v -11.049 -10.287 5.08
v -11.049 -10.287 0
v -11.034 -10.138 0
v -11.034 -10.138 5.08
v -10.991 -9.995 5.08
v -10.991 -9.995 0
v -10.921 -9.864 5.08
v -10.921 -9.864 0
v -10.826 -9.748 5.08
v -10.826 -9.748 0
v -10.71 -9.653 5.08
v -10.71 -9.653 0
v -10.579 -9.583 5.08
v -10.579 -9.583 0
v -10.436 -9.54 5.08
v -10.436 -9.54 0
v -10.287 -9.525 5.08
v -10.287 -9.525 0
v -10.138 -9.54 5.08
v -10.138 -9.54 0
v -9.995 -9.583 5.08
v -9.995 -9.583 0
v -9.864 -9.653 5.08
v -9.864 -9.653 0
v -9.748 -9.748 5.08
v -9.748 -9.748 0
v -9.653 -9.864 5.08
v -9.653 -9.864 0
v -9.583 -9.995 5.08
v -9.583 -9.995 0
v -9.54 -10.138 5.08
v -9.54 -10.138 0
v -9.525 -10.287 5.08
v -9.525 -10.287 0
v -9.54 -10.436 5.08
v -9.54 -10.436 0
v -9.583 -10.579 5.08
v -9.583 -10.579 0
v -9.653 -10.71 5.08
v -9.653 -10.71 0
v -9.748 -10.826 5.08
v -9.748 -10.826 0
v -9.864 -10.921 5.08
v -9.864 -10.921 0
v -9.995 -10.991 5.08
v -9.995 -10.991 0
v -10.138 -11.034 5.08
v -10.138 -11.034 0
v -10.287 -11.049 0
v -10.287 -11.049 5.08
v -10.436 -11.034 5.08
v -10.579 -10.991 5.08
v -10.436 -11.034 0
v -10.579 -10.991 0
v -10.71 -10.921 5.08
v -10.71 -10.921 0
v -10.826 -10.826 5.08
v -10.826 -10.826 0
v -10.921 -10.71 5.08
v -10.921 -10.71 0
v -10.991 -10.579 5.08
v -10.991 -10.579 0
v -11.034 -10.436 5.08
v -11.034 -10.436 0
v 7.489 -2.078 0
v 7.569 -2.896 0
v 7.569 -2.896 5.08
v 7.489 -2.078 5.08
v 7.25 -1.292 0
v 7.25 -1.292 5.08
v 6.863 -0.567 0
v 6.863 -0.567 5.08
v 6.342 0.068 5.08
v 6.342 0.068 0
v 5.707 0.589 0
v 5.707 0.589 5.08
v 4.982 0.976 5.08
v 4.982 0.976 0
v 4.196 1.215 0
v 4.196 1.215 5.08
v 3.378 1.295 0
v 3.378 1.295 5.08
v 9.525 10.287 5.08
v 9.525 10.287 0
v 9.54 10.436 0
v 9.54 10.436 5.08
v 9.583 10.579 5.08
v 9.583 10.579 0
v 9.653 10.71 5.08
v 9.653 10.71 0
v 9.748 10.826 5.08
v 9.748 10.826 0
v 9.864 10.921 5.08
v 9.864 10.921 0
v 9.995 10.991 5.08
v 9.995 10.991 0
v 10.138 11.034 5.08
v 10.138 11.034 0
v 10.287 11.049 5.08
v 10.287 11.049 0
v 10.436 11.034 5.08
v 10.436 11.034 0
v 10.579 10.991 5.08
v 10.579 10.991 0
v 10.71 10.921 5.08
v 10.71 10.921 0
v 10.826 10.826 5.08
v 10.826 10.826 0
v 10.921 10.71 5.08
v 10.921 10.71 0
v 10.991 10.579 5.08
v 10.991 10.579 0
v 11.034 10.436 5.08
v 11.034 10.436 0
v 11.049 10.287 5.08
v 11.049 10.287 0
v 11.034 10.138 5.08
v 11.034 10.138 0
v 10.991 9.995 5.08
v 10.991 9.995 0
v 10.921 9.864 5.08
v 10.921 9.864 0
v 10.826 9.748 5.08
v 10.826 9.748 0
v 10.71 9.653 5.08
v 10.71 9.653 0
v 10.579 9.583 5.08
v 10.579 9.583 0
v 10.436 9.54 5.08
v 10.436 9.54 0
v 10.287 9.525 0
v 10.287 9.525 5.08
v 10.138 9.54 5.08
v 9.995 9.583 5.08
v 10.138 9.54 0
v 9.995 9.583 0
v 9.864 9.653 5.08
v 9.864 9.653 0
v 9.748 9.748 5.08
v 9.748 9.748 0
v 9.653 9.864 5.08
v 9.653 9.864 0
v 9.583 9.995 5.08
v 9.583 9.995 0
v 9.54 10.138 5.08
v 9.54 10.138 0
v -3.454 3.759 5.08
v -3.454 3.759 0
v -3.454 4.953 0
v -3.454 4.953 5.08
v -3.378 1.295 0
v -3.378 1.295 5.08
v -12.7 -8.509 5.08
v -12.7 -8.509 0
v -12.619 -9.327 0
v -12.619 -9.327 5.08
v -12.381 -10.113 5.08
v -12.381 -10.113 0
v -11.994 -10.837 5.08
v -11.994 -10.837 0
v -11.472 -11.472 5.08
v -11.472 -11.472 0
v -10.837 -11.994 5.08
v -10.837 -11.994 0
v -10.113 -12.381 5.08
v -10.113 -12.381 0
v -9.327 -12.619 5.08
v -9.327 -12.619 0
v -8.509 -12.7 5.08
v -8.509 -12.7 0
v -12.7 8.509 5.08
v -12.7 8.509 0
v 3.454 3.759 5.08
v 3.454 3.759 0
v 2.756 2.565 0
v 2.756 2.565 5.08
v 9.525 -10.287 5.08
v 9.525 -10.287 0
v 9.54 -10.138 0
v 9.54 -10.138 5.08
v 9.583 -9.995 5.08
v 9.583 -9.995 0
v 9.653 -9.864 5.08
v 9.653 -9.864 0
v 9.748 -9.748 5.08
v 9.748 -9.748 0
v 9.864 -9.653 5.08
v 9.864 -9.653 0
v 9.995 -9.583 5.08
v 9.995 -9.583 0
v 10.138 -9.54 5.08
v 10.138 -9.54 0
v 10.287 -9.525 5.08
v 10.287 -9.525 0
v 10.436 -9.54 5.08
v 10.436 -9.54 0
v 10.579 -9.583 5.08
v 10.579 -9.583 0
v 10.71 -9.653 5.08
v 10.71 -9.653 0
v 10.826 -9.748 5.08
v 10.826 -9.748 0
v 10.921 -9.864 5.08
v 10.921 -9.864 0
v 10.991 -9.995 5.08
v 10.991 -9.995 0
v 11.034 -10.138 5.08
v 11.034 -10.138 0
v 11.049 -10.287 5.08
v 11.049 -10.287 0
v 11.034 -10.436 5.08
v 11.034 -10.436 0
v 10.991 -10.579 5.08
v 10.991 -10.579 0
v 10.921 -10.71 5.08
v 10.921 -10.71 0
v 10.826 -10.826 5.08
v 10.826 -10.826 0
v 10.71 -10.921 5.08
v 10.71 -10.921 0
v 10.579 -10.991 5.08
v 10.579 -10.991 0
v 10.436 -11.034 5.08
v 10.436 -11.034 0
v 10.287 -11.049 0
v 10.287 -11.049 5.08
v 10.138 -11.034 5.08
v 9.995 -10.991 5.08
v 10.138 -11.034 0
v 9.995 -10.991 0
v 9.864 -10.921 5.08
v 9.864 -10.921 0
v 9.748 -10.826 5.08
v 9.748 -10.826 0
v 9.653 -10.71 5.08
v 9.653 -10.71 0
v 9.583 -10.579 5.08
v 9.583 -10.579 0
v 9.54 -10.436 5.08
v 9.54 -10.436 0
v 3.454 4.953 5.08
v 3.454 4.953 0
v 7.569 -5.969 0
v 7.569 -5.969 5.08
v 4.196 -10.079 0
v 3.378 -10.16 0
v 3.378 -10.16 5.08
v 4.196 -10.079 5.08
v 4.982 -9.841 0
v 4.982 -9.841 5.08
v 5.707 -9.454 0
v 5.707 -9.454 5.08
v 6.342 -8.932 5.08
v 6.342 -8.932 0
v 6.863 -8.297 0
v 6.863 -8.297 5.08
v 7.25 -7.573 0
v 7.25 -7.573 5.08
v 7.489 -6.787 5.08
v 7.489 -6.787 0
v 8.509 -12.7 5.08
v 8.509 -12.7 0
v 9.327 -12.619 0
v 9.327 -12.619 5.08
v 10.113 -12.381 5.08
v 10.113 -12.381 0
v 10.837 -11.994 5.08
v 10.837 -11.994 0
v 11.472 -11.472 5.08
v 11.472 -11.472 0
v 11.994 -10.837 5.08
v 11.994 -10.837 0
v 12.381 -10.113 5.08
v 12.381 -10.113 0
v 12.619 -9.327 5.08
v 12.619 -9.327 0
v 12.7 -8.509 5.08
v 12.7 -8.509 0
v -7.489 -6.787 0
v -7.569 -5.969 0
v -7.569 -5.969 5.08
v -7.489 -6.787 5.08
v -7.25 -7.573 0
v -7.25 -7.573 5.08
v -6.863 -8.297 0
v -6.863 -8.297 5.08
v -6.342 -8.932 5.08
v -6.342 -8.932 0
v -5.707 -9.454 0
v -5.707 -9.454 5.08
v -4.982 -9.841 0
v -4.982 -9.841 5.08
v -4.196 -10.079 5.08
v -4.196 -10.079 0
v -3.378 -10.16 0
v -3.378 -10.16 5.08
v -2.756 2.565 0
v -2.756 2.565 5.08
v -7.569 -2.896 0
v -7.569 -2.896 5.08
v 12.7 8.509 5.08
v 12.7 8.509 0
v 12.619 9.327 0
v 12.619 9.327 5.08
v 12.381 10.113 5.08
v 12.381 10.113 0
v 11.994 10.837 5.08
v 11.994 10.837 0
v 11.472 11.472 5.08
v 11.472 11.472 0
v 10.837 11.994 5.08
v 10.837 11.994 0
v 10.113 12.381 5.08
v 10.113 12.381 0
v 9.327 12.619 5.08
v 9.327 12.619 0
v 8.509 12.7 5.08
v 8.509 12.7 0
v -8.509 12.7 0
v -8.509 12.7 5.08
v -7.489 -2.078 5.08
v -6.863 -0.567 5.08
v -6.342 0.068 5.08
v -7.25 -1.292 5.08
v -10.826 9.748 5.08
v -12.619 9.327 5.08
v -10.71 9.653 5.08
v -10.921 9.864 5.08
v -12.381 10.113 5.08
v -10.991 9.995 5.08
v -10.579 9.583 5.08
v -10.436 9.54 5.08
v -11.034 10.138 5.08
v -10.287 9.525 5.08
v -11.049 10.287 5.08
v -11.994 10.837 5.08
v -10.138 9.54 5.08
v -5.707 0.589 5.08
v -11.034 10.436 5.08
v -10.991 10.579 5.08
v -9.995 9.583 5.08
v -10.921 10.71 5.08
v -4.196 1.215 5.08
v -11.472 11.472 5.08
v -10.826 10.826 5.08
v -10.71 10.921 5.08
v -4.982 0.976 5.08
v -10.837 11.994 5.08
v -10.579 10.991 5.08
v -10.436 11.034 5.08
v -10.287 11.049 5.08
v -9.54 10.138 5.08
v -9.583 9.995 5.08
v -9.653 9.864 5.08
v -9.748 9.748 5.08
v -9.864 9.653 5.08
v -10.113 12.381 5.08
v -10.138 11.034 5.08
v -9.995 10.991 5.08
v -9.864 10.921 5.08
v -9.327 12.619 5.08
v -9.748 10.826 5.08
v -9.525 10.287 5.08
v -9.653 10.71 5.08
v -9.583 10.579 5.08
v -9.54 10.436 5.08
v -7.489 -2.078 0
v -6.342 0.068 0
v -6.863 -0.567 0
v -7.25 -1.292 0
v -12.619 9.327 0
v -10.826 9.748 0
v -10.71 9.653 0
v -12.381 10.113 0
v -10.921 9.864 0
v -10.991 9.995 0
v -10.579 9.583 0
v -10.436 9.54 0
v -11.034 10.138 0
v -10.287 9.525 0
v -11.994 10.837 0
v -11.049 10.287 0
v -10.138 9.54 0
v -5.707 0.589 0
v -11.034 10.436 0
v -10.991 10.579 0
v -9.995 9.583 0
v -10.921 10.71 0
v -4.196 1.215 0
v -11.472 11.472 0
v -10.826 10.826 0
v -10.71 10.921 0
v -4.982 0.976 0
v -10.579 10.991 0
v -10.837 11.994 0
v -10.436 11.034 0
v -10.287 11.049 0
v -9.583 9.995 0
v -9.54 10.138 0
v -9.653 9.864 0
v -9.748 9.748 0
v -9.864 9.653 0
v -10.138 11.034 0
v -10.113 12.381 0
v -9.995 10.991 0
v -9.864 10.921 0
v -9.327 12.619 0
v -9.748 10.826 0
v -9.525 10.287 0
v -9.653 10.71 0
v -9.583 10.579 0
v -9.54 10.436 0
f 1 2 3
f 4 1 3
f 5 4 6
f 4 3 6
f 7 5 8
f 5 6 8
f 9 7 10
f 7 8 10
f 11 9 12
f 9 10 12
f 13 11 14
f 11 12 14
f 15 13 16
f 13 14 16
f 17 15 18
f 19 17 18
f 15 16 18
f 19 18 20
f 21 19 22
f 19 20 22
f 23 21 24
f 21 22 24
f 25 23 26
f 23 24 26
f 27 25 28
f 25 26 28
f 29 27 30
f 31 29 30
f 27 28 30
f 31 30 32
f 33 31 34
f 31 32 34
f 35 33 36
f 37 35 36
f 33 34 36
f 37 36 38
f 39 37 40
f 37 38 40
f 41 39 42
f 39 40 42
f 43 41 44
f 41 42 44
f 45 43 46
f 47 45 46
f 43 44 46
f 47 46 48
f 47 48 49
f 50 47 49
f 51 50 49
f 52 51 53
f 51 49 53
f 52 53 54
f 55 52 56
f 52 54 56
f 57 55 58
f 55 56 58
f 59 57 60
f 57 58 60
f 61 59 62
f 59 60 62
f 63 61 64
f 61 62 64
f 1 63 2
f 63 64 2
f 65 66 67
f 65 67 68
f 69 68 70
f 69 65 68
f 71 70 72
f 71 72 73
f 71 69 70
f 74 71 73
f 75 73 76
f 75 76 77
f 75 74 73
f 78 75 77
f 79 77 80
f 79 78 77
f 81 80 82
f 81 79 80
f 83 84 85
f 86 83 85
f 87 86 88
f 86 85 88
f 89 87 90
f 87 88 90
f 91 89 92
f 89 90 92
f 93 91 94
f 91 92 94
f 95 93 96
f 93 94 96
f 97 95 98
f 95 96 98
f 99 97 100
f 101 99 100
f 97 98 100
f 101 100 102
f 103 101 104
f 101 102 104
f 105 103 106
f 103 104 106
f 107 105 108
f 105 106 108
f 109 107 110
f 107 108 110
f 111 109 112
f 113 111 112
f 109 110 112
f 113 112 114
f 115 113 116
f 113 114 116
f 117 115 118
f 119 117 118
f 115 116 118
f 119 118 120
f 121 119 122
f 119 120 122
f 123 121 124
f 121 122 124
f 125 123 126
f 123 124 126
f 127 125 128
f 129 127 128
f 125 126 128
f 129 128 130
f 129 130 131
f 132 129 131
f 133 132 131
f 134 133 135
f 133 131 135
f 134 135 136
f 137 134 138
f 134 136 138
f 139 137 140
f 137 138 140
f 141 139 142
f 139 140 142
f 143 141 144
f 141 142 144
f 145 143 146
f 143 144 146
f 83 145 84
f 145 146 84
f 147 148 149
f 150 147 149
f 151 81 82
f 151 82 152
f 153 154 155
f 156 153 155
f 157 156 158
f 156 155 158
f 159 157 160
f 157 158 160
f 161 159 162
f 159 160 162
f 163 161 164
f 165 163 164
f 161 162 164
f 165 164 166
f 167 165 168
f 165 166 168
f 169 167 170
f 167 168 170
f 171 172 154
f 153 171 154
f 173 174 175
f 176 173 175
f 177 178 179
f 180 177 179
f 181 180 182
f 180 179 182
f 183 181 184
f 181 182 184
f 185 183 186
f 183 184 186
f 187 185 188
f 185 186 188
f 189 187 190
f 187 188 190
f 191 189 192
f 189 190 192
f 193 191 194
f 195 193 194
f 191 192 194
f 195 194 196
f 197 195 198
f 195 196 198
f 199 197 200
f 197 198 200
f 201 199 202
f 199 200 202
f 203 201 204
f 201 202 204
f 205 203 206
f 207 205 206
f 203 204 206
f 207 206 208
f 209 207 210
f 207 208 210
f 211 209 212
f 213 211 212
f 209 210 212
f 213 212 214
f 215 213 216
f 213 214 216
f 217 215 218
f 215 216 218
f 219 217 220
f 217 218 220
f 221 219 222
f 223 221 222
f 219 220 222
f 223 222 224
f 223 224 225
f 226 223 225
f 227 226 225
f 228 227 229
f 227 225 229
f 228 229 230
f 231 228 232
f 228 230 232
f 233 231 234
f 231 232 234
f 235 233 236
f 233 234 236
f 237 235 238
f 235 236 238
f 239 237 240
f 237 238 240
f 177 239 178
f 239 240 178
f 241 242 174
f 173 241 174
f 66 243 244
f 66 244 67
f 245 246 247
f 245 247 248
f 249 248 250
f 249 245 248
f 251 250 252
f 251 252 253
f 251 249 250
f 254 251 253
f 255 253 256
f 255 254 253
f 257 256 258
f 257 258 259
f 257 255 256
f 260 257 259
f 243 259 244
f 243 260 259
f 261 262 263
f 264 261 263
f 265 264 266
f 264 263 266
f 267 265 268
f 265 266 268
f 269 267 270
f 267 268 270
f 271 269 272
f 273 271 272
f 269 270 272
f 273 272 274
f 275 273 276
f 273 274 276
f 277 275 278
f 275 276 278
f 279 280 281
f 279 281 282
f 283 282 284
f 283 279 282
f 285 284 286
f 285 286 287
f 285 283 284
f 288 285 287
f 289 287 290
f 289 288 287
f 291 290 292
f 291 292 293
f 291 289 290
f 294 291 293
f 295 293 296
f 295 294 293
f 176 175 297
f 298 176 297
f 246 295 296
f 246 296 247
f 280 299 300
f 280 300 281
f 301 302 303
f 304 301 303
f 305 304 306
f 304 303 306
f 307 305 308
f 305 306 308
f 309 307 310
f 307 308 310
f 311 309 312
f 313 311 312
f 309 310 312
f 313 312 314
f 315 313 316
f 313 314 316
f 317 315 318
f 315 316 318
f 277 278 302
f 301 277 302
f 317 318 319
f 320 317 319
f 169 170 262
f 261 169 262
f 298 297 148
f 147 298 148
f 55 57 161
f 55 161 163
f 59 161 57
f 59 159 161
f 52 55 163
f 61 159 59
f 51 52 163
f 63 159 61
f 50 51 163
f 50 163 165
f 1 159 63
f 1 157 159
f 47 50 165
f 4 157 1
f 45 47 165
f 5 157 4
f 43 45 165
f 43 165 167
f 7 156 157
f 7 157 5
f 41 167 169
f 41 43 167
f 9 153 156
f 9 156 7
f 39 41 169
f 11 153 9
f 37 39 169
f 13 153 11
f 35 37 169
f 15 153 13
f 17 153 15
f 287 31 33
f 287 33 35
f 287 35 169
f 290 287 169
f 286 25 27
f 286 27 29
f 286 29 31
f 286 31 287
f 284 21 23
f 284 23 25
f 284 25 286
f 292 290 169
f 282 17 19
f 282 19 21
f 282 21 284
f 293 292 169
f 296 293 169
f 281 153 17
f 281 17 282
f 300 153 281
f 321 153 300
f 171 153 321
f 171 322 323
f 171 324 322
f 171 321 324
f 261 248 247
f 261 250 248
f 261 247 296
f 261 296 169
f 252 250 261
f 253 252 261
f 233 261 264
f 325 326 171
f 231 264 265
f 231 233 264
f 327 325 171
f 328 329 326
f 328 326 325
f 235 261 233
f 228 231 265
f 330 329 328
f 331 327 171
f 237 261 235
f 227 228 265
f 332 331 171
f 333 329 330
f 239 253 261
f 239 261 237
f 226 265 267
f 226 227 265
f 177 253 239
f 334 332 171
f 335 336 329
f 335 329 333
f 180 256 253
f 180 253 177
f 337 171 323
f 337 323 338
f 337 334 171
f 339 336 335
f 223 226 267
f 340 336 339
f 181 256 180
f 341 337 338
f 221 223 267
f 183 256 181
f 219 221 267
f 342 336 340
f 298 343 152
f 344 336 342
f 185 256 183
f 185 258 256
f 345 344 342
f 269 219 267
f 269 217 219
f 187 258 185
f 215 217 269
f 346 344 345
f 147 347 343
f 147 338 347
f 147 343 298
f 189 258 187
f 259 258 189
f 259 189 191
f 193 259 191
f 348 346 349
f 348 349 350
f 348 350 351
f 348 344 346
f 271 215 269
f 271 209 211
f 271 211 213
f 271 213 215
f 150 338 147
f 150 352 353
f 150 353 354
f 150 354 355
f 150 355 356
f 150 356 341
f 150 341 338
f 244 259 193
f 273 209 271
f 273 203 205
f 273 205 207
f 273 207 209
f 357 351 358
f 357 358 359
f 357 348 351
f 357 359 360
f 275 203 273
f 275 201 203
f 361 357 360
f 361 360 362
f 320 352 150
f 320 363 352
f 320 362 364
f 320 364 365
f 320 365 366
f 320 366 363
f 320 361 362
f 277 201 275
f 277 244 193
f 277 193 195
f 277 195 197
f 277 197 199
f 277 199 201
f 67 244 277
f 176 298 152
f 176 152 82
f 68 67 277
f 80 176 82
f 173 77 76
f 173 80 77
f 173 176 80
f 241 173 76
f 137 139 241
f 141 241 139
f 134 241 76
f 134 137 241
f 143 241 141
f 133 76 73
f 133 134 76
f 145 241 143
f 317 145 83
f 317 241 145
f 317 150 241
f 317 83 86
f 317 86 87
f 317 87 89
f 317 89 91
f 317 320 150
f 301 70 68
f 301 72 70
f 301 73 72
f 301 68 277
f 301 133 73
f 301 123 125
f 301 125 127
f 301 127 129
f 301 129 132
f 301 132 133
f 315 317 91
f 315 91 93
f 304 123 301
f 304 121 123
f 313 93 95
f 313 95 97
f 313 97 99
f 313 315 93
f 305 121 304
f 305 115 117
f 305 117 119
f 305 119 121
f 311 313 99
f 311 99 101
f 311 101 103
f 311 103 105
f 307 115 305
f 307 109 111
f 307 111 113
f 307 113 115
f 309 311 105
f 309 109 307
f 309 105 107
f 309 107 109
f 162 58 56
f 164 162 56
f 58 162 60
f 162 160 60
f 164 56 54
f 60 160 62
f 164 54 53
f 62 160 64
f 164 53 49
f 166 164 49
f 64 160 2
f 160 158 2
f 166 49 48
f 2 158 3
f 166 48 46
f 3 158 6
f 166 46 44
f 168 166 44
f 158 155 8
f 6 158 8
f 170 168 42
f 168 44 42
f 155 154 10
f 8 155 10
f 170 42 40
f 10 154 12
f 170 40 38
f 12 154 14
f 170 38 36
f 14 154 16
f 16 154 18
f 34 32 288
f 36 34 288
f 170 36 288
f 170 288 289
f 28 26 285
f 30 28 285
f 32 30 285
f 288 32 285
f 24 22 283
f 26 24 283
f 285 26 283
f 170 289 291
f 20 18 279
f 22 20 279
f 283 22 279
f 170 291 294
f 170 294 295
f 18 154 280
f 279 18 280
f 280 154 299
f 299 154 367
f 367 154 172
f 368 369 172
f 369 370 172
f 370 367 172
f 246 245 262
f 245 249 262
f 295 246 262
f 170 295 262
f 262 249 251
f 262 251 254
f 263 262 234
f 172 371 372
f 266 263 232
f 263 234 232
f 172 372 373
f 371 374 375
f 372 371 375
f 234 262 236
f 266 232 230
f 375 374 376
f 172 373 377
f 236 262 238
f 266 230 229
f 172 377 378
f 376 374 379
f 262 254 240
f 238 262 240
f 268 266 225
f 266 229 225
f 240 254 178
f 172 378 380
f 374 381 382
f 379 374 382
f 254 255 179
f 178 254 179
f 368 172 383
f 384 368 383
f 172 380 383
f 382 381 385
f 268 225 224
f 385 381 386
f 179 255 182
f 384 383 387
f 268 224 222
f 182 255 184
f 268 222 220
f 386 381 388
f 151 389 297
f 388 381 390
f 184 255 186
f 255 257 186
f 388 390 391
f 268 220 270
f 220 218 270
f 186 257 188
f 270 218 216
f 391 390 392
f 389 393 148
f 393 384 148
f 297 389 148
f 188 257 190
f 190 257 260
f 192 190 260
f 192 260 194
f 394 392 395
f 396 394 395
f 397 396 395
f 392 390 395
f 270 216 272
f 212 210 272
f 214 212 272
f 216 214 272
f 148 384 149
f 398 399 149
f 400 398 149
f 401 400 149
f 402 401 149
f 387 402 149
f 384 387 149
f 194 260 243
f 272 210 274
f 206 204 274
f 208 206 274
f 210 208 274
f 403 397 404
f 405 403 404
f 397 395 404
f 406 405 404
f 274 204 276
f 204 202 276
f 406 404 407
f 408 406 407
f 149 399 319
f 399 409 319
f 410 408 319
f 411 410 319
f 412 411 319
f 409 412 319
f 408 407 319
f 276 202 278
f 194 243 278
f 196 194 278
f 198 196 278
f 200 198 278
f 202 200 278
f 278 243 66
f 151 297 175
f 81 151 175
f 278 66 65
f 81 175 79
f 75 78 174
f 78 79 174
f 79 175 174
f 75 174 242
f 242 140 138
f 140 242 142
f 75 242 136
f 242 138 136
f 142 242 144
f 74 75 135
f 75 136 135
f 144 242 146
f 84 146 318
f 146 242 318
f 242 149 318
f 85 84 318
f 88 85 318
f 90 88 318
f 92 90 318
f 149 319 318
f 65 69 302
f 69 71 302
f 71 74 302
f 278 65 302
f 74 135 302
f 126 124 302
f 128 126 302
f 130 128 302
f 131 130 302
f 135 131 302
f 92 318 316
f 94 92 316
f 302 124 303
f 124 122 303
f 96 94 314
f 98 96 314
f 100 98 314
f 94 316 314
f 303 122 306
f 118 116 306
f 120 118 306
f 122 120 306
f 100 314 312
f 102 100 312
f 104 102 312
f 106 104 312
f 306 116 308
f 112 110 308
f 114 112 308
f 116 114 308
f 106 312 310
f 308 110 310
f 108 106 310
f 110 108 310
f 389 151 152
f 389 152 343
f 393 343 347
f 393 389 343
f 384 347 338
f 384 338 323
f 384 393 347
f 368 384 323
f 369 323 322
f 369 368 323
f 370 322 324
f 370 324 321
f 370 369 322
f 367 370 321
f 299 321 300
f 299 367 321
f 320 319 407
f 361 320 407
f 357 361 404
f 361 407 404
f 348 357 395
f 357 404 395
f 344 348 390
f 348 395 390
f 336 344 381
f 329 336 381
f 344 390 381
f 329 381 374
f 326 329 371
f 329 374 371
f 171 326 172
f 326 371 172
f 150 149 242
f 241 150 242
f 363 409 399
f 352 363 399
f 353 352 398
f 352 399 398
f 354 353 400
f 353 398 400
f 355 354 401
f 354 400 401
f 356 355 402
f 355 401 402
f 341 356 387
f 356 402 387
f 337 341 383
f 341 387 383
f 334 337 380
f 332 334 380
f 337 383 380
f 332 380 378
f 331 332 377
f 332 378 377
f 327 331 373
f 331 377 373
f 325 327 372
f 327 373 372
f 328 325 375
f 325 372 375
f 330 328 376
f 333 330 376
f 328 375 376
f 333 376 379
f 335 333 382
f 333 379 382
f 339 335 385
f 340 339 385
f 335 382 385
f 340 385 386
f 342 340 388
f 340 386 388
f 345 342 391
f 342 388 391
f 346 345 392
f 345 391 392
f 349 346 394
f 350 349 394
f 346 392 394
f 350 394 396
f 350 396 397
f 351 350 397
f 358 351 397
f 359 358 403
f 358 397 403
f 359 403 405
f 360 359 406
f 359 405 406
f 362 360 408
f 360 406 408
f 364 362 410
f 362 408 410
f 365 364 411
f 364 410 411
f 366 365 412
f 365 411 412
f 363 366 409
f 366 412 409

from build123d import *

# Parameters (mm, degrees)
BOSS_EXTRUDE1_DEPTH = 5.08
CUT_EXTRUDE1_DEPTH  = 5.08
SKETCH3_R           = 0.762
CUT_EXTRUDE2_DEPTH  = 5.08


with BuildPart() as part:
    # Sketch1 → Boss-Extrude1 (new body)
    with BuildSketch(Plane.XY):
        with BuildLine():
            Line((-8.509, -12.7), (8.509, -12.7))
            ThreePointArc((8.509, -12.7), (11.47248452, -11.47248452), (12.7, -8.509))
            Line((12.7, -8.509), (12.7, 8.509))
            ThreePointArc((12.7, 8.509), (11.47248452, 11.47248452), (8.509, 12.7))
            Line((8.509, 12.7), (-8.509, 12.7))
            ThreePointArc((-8.509, 12.7), (-11.47248452, 11.47248452), (-12.7, 8.509))
            Line((-12.7, 8.509), (-12.7, -8.509))
            ThreePointArc((-12.7, -8.509), (-11.47248452, -11.47248452), (-8.509, -12.7))
        make_face()
    extrude(amount=BOSS_EXTRUDE1_DEPTH)

    # Sketch2 → Cut-Extrude1 (cut)
    with BuildSketch(Plane(origin=(0, 0, 0), x_dir=(-1, 0, 0), z_dir=(0, 0, -1))):
        Polygon((-2.7559, 2.5654), (0, 2.5654), (0, 4.953), (-3.4544, 4.953), (-3.4544, 3.7592), align=None)
        Polygon((0, 4.953), (0, 2.5654), (2.7559, 2.5654), (3.4544, 3.7592), (3.4544, 4.953), align=None)
        with BuildLine():
            ThreePointArc((-7.5692, -2.8956), (-6.34168452, 0.06788452), (-3.3782, 1.2954))
            Line((-3.3782, 1.2954), (3.3782, 1.2954))
            ThreePointArc((3.3782, 1.2954), (6.34168452, 0.06788452), (7.5692, -2.8956))
            Line((7.5692, -2.8956), (7.5692, -5.969))
            ThreePointArc((7.5692, -5.969), (6.34168452, -8.93248452), (3.3782, -10.16))
            Line((3.3782, -10.16), (-3.3782, -10.16))
            ThreePointArc((-3.3782, -10.16), (-6.34168452, -8.93248452), (-7.5692, -5.969))
            Line((-7.5692, -5.969), (-7.5692, -2.8956))
        make_face()
    extrude(amount=-CUT_EXTRUDE1_DEPTH, mode=Mode.SUBTRACT)

    # Sketch3 → Cut-Extrude2 (cut)
    with BuildSketch(Plane(origin=(0, 0, 0), x_dir=(-1, 0, 0), z_dir=(0, 0, -1))):
        with Locations((10.287, -10.287)):
            Circle(SKETCH3_R)
        with Locations((-10.287, -10.287)):
            Circle(SKETCH3_R)
        with Locations((-10.287, 10.287)):
            Circle(SKETCH3_R)
        with Locations(Location((10.287, 10.287, 0), (0, 0, 180))):
            Circle(SKETCH3_R)
    extrude(amount=-CUT_EXTRUDE2_DEPTH, mode=Mode.SUBTRACT)


solid = part.part
